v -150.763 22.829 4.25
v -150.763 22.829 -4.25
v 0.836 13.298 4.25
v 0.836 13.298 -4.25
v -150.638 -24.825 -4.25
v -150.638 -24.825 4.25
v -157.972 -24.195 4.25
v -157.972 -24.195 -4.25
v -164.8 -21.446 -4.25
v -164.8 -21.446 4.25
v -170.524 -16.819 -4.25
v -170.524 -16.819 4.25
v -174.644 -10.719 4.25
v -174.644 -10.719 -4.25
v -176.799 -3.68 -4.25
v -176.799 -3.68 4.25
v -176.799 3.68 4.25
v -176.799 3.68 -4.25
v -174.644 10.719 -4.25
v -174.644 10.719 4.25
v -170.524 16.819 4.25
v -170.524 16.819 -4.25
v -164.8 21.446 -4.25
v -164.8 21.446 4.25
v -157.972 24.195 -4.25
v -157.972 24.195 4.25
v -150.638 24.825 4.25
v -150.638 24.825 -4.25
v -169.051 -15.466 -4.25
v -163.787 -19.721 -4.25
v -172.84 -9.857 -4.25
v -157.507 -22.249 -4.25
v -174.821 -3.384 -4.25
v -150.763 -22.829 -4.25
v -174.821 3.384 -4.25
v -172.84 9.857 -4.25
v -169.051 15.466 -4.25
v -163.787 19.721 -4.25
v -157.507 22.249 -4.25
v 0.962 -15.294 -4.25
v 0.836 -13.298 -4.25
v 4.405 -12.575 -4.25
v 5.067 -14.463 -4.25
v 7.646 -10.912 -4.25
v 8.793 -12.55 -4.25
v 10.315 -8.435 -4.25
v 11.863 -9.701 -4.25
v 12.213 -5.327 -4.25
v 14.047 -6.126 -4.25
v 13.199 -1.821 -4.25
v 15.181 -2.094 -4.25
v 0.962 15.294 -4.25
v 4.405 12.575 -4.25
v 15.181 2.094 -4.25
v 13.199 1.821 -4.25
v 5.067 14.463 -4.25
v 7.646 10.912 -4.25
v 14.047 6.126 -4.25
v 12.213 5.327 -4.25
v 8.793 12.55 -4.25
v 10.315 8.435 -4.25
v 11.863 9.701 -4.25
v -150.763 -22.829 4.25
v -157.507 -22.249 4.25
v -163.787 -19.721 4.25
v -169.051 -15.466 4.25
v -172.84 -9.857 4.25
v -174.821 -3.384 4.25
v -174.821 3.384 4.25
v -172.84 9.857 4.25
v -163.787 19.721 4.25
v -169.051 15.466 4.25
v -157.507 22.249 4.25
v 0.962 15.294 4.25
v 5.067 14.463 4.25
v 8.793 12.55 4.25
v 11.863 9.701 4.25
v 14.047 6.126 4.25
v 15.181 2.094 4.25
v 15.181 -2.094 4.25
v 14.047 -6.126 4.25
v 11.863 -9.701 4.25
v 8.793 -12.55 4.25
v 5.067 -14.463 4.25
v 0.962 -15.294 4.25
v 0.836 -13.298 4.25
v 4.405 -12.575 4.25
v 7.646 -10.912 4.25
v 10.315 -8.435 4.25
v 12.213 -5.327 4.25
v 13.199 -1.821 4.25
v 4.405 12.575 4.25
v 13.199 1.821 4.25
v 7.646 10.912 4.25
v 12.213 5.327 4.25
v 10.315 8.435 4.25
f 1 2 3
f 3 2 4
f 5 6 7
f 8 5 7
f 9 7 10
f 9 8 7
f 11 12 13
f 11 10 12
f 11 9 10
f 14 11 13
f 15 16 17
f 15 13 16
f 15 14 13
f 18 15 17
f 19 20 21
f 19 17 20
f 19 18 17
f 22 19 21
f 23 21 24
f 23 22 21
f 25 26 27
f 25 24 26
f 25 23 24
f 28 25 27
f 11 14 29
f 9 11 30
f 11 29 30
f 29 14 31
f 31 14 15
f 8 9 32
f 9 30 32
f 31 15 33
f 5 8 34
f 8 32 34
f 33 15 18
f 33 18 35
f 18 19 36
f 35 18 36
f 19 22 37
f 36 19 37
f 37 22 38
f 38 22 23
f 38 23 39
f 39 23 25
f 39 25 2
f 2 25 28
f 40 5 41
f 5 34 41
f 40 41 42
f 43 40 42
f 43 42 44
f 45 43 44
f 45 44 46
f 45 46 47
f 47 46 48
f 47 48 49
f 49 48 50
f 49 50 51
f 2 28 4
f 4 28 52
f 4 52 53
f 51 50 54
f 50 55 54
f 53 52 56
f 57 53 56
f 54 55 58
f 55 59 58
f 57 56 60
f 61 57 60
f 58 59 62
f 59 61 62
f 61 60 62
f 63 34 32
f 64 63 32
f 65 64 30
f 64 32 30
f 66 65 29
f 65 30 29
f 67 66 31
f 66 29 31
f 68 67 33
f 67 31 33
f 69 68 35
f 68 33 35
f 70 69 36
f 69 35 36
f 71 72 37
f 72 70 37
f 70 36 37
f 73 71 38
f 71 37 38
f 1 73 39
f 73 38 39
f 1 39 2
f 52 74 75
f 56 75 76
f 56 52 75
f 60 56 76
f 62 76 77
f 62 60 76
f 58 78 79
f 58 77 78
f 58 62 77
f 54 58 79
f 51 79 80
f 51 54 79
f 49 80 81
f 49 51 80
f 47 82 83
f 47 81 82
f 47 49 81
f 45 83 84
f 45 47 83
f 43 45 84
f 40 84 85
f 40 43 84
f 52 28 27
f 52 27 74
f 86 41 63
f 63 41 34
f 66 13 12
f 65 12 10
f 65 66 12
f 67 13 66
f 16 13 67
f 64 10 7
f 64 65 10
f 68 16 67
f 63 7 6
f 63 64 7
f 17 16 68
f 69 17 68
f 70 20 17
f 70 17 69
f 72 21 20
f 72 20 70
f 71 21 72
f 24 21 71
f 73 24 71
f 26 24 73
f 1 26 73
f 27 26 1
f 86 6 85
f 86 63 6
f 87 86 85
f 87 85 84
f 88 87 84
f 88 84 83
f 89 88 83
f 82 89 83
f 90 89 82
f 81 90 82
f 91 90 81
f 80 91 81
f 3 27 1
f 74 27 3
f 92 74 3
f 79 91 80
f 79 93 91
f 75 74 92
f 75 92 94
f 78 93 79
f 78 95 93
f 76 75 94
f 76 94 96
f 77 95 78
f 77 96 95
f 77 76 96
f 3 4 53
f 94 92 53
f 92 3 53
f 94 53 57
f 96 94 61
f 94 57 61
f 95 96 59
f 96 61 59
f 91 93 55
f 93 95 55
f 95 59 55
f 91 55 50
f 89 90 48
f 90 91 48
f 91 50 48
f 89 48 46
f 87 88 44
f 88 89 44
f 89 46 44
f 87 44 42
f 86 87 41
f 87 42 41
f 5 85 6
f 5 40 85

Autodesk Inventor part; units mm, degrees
ref_plane "YZ Plane" through (0, 0, 0) normal (1, 0, 0) x (0, 1, 0)
ref_plane "XZ Plane" through (0, 0, 0) normal (0, 1, 0) x (-1, 0, 0)
ref_plane "XY Plane" through (0, 0, 0) normal (0, 0, 1) x (1, 0, 0)
sketch "Sketch1" plane through (0, 0, 0) normal (0, 0, 1) x (1, 0, 0)
  arc A0 (0.8988, -14.2961) -> (0.8988, 14.2961) centre (0, 0) ccw construction
  arc A1 (-150.7006, 23.8269) -> (-150.7006, -23.8269) centre (-152.1985, 0) ccw construction
  line L0 (0.8988, -14.2961) -> (-150.7006, -23.8269) construction
  line L1 (0.8988, 14.2961) -> (-150.7006, 23.8269) construction
  dimension "Belt_Teeth" = 85
  dimension "Belt_Pitch2" = 5
  dimension "d0" = 28.6487
  dimension "d1" = 47.7479
  dimension "d2" = 43.2026
  dimension "d3" = 78.0001
  dimension "Center_Distance" = 152.1985
  dimension "d5" = 151.8987
sketch "Sketch2" plane through (0, 0, 0) normal (0, 0, 1) x (1, 0, 0)
  line L0 (35.7235, 34.2567) -> (40.7235, 34.2567)
  point P0 (0, 0)
  dimension "Belt_Pitch2" = 5
sketch "Sketch4" plane through (0, 0, 0) normal (0, 0, 1) x (1, 0, 0)
  line L0 (-16.1422, -21.869) -> (-14.1422, -21.869)
  line L1 (-16.1422, -21.869) -> (-16.1422, -20.349)
  arc A0 (-15.5872, -20.904) -> (-16.1422, -20.349) centre (-16.1422, -20.904) ccw
  line L2 (-15.5872, -20.904) -> (-15.5872, -20.959)
  arc A1 (-15.5872, -20.959) -> (-15.4372, -21.109) centre (-15.4372, -20.959) ccw
  line L3 (-15.4372, -21.109) -> (-14.8472, -21.109)
  line L4 (-14.1422, -21.869) -> (-14.1422, -20.349)
  arc A2 (-14.1422, -20.349) -> (-14.6972, -20.904) centre (-14.1422, -20.904) ccw
  arc A3 (-14.8472, -21.109) -> (-14.6972, -20.959) centre (-14.8472, -20.959) ccw
  line L5 (-14.6972, -20.959) -> (-14.6972, -20.904)
  line L6 (0.8988, 14.2961) -> (-150.7006, 23.8269) construction
  arc A4 (-150.7006, 23.8269) -> (-150.7006, -23.8269) centre (-152.1985, 0) ccw construction
  line L7 (0.8988, -14.2961) -> (-150.7006, -23.8269) construction
  arc A5 (0.8988, -14.2961) -> (0.8988, 14.2961) centre (0, 0) ccw construction
  arc A6 (-150.6378, 24.8249) -> (-150.6378, -24.8249) centre (-152.1985, 0) ccw
  line L8 (-150.6378, 24.8249) -> (0.9615, 15.2942)
  arc A7 (0.9615, -15.2942) -> (0.9615, 15.2942) centre (0, 0) ccw
  line L9 (0.9615, -15.2942) -> (-150.6378, -24.8249)
  arc A8 (-150.7633, 22.8289) -> (-150.7633, -22.8289) centre (-152.1985, 0) ccw
  line L10 (-150.7633, 22.8289) -> (0.836, 13.2981)
  arc A9 (0.836, -13.2981) -> (0.836, 13.2981) centre (0, 0) ccw
  line L11 (0.836, -13.2981) -> (-150.7633, -22.8289)
  point P0 (-15.1422, -21.109)
  point P1 (-15.1422, -21.869)
  dimension "d9" = 2
  dimension "d10" = 1.52
  dimension "d11" = 0.76
  dimension "d12" = 0.555
  dimension "d13" = 0.555
  dimension "d14" = 0.15
  dimension "d15" = 0.15
  dimension "belt_thickness" = 2
  dimension "d44" = 1
extrude "Extrusion2" add sketch "Sketch4" along normal mid plane 8.5 contours L8 A7 L9 A6
sketch "Sketch5" plane through (0, 0, 4.25) normal (0, 0, 1) x (1, 0, 0)
  line L0 (-150.7633, 22.8289) -> (0.836, 13.2981) construction
  arc A0 (0.836, -13.2981) -> (0.836, 13.2981) centre (0, 0) ccw construction
  line L1 (0.836, -13.2981) -> (-150.7633, -22.8289) construction
  arc A1 (-150.7633, 22.8289) -> (-150.7633, -22.8289) centre (-152.1985, 0) ccw construction
  arc A2 (-150.6378, 24.8249) -> (-150.6378, -24.8249) centre (-152.1985, 0) ccw construction
  line L2 (-150.6378, -24.8249) -> (0.9615, -15.2942) construction
  arc A3 (0.9615, -15.2942) -> (0.9615, 15.2942) centre (0, 0) ccw construction
  line L3 (0.9615, 15.2942) -> (-150.6378, 24.8249) construction
  line L4 (-7.7556, -2.6989) -> (-5.7556, -2.6989)
  line L5 (-7.7556, -2.6989) -> (-7.7556, -1.1789) construction
  arc A4 (-7.2006, -1.7339) -> (-7.7556, -1.1789) centre (-7.7556, -1.7339) ccw
  line L6 (-7.2006, -1.7339) -> (-7.2006, -1.7889)
  arc A5 (-7.2006, -1.7889) -> (-7.0506, -1.9389) centre (-7.0506, -1.7889) ccw
  line L7 (-7.0506, -1.9389) -> (-6.4606, -1.9389)
  line L8 (-5.7556, -2.6989) -> (-5.7556, -1.1789)
  arc A6 (-5.7556, -1.1789) -> (-6.3106, -1.7339) centre (-5.7556, -1.7339) ccw
  arc A7 (-6.4606, -1.9389) -> (-6.3106, -1.7889) centre (-6.4606, -1.7889) ccw
  line L9 (-6.3106, -1.7889) -> (-6.3106, -1.7339)
  line L10 (-8.3106, -1.7339) -> (-8.3106, -1.7889)
  arc A8 (-7.7556, -1.1789) -> (-8.3106, -1.7339) centre (-7.7556, -1.7339) ccw
  arc A9 (-8.4606, -1.9389) -> (-8.3106, -1.7889) centre (-8.4606, -1.7889) ccw
  line L11 (-8.4606, -1.9389) -> (-9.0506, -1.9389)
  line L12 (-7.7556, -2.6989) -> (-9.7556, -2.6989)
  line L13 (-9.2006, -1.7889) -> (-9.2006, -1.7339)
  arc A10 (-9.2006, -1.7339) -> (-9.7556, -1.1789) centre (-9.7556, -1.7339) ccw
  line L14 (-9.7556, -2.6989) -> (-9.7556, -1.1789)
  arc A11 (-9.2006, -1.7889) -> (-9.0506, -1.9389) centre (-9.0506, -1.7889) ccw
  line L15 (-17.66, -0.8495) -> (-14.922, -0.8495) construction
  line L16 (-14.922, -0.8495) -> (-14.922, -2.3671) construction
  line L17 (-14.922, -2.3671) -> (-17.66, -2.3671) construction
  line L18 (-17.66, -2.3671) -> (-17.66, -0.8495) construction
  arc A12 (-15.6383, -1.7102) -> (-16.7483, -1.7102) centre (-16.1933, -1.7102) ccw construction
  line L19 (-16.7483, -1.7102) -> (-16.7483, -1.7652) construction
  arc A13 (-16.8983, -1.9152) -> (-16.7483, -1.7652) centre (-16.8983, -1.7652) ccw construction
  line L20 (-16.7483, -1.7102) -> (-16.7483, -1.9152) construction
  line L21 (-15.6383, -1.7102) -> (-15.6383, -1.9152) construction
  point P0 (-6.7556, -1.9389)
  point P1 (-6.7556, -2.6989)
  point P2 (-8.7556, -2.6989)
  point P3 (-8.7556, -1.9389)
  dimension "d22" = 2
  dimension "d23" = 1.52
  dimension "d24" = 0.76
  dimension "d25" = 0.555
  dimension "d26" = 0.555
  dimension "d27" = 0.15
  dimension "d28" = 0.15
  dimension "d29" = 0.76
  dimension "d30" = 1
  dimension "d31" = 2
  dimension "d32" = 0.59
  dimension "d34" = 0.555
  dimension "d35" = 0
  dimension "d36" = 0
  dimension "d37" = 0.15
  dimension "d38" = 0.055
  dimension "d39" = 0.055
  dimension "d40" = 0
  dimension "d41" = 0
  dimension "d42" = 0.205
  dimension "d43" = 0.205
equation "\"d13\" = d12"
equation "\"d15\" = d14"
equation "\"d44\" = 0.5 * belt_thickness"
equation "\"d26\" = d25"
equation "\"d28\" = d27"
equation "\"d30\" = 0.5 * d22"
equation "\"d31\" = d22"
equation "\"d43\" = d42"
equation "\"Belt_Teeth\" = 85"
equation "\"Belt_Pitch\" = 3"
equation "\"HTD_5mm\" = 5"
equation "\"GT2_3mm\" = 3"
equation "\"Center_Distance_Copy\" = Center_Distance"
properties part number "GP6-014 - 85T belt" material "Rubber"
